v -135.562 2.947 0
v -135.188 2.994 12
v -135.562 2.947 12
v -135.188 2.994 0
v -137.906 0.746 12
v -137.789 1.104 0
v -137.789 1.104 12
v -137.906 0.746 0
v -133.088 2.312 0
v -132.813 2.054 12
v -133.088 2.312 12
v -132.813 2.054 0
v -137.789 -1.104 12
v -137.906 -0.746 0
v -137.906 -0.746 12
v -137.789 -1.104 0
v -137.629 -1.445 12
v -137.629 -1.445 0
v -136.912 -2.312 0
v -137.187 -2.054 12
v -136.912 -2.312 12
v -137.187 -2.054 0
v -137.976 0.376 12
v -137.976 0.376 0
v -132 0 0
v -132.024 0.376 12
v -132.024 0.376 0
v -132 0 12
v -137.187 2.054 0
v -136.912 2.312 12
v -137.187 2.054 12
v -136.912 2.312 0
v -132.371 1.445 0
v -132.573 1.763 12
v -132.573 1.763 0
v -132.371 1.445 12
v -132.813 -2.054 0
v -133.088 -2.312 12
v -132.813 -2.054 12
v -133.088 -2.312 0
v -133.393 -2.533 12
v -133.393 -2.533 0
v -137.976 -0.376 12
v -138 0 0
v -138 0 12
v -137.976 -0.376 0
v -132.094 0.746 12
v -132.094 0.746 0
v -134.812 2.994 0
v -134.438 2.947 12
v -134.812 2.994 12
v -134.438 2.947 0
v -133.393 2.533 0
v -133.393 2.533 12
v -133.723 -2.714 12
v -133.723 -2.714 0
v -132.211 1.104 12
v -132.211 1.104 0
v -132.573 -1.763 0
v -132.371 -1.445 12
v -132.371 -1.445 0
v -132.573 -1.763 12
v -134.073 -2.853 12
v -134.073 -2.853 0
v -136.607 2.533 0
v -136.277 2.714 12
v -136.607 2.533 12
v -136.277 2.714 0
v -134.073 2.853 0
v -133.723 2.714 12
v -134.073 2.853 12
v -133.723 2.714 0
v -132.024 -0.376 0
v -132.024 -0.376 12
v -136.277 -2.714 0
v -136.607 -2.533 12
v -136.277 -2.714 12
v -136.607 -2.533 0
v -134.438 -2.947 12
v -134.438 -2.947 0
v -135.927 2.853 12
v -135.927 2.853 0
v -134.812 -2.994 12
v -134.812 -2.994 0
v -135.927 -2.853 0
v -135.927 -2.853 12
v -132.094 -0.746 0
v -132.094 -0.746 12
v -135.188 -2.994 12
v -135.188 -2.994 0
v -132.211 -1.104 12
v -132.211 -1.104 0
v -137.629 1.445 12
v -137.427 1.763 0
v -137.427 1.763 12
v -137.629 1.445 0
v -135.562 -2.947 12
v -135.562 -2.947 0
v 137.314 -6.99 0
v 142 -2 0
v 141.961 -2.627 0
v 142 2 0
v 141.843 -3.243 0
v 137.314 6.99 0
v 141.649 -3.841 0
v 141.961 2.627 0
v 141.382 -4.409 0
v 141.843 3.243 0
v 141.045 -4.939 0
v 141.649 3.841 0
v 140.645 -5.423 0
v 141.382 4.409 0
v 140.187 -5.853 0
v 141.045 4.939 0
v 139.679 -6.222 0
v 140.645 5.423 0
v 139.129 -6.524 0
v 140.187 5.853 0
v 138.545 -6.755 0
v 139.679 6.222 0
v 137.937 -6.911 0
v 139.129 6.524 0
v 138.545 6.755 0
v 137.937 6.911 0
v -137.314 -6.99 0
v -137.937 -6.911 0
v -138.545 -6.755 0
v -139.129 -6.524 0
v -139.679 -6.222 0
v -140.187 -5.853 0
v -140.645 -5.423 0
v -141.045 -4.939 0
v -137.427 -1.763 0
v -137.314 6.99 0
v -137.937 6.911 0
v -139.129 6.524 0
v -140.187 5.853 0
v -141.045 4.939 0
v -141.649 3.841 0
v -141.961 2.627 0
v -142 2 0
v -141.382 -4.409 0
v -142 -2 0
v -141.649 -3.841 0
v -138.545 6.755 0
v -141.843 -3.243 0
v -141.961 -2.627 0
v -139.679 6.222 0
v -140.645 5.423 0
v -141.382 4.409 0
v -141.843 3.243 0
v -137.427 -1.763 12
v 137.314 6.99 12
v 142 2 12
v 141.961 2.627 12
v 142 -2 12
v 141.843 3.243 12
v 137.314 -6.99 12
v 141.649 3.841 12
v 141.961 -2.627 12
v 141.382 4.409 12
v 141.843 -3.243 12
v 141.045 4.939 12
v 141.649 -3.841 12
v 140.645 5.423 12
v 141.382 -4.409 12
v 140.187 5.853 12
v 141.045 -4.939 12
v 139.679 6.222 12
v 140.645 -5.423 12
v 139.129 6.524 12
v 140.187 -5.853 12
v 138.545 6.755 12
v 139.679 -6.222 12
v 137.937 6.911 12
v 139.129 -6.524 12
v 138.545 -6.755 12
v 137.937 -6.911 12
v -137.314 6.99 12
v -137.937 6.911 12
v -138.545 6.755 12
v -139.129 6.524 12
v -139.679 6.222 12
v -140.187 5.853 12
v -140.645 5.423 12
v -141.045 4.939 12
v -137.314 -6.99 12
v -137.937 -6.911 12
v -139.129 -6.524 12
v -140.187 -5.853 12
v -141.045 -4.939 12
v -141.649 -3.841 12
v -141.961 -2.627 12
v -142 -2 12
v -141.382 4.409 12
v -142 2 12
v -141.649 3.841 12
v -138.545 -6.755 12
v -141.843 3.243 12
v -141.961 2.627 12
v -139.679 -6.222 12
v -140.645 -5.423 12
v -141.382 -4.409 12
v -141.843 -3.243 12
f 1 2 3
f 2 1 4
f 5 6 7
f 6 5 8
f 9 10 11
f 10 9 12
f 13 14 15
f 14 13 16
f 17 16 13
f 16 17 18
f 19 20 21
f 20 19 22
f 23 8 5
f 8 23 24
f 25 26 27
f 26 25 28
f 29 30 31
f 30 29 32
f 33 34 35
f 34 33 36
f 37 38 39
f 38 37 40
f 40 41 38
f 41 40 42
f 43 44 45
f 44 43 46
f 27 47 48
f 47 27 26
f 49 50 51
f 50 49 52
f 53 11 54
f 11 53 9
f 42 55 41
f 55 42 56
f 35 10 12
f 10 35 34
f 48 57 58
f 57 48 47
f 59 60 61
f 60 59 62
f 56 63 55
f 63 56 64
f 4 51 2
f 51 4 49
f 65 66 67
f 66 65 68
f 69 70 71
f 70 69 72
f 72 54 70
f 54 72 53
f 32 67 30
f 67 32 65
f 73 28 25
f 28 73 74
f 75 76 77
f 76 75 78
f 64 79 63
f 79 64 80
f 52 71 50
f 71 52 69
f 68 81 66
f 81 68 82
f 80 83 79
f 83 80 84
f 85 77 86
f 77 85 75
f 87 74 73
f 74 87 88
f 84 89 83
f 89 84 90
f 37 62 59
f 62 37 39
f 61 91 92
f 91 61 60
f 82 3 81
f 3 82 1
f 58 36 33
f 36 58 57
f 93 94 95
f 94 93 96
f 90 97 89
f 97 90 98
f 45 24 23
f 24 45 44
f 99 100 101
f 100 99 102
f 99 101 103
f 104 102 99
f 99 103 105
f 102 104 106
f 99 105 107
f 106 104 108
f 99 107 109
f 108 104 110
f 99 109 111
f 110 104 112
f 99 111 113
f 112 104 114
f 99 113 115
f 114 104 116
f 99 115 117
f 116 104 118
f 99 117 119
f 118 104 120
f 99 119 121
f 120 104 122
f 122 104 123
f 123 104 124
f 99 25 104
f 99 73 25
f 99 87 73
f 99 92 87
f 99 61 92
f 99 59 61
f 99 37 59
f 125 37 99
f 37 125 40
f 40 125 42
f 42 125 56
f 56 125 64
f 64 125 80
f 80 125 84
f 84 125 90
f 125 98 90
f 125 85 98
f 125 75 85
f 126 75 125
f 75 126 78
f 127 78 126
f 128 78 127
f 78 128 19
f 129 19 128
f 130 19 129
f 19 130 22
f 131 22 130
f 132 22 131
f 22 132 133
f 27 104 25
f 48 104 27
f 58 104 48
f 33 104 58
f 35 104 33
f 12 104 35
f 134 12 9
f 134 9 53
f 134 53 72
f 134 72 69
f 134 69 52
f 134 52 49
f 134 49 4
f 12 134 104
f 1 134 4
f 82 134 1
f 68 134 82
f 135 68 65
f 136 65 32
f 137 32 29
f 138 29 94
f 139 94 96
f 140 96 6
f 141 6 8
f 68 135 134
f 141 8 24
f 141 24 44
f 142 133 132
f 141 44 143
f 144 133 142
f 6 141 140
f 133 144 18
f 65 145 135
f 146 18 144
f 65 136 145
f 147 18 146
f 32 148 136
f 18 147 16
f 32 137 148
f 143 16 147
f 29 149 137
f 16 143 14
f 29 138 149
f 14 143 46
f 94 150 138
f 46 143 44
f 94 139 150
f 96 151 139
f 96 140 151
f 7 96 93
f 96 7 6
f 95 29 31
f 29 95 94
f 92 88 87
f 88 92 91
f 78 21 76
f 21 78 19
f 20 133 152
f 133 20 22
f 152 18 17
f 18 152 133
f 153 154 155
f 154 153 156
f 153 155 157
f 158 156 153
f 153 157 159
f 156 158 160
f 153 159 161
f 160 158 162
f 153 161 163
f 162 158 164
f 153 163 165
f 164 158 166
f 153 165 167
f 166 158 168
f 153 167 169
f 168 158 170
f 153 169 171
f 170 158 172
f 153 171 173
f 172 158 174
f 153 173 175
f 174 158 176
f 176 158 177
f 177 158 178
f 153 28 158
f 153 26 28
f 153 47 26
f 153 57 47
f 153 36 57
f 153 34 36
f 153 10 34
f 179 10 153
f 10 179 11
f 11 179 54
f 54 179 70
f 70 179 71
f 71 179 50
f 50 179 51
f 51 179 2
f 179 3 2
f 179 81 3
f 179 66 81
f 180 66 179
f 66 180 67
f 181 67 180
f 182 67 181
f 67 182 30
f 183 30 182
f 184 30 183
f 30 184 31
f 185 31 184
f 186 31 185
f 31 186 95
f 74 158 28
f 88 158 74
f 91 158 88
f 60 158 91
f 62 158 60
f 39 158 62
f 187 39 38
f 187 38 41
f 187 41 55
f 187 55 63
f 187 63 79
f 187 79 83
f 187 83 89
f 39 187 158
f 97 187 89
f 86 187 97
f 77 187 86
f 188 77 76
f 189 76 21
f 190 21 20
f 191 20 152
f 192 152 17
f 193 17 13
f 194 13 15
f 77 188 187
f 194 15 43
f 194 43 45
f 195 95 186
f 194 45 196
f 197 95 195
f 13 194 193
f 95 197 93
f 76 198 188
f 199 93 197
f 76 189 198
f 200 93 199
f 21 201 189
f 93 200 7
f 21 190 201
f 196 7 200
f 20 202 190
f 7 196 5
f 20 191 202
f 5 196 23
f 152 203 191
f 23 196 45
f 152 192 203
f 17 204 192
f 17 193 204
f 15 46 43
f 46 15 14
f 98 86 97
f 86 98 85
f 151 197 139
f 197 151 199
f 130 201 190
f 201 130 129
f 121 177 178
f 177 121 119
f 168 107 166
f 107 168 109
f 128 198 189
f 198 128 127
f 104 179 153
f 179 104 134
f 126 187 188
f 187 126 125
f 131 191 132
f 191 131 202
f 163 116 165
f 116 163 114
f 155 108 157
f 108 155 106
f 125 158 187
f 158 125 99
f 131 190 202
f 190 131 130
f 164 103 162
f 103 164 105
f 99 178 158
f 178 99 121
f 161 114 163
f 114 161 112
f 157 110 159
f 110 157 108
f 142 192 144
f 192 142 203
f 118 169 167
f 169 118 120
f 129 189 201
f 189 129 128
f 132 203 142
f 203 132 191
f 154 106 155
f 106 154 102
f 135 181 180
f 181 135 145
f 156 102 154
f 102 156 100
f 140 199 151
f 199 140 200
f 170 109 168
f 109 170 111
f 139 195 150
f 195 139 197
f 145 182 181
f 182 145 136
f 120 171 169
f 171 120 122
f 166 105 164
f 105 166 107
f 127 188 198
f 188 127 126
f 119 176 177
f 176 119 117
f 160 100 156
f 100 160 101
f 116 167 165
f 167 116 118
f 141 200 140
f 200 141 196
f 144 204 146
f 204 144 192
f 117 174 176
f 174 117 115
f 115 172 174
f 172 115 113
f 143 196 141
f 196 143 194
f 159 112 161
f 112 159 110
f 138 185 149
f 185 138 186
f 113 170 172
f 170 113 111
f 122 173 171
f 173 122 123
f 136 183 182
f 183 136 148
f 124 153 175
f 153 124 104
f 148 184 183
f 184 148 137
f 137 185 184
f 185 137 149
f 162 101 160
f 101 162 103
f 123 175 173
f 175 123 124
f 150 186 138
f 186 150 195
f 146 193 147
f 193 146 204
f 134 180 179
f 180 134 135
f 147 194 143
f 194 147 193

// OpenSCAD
$fn = 50;


difference() {
	union() {
		hull() {
			translate(v = [-137.0000000000, 2.0000000000, 0]) {
				cylinder(h = 12, r = 5);
			}
			translate(v = [137.0000000000, 2.0000000000, 0]) {
				cylinder(h = 12, r = 5);
			}
			translate(v = [-137.0000000000, -2.0000000000, 0]) {
				cylinder(h = 12, r = 5);
			}
			translate(v = [137.0000000000, -2.0000000000, 0]) {
				cylinder(h = 12, r = 5);
			}
		}
	}
	union() {
		translate(v = [-135.0000000000, 0.0000000000, 0]) {
			cylinder(h = 12, r = 3.0000000000);
		}
		translate(v = [-135.0000000000, 0.0000000000, 0]) {
			cylinder(h = 12, r = 1.5000000000);
		}
		translate(v = [-135.0000000000, 0.0000000000, 0]) {
			cylinder(h = 12, r = 1.5000000000);
		}
		translate(v = [-135.0000000000, 0.0000000000, 0]) {
			cylinder(h = 12, r = 1.5000000000);
		}
	}
}
